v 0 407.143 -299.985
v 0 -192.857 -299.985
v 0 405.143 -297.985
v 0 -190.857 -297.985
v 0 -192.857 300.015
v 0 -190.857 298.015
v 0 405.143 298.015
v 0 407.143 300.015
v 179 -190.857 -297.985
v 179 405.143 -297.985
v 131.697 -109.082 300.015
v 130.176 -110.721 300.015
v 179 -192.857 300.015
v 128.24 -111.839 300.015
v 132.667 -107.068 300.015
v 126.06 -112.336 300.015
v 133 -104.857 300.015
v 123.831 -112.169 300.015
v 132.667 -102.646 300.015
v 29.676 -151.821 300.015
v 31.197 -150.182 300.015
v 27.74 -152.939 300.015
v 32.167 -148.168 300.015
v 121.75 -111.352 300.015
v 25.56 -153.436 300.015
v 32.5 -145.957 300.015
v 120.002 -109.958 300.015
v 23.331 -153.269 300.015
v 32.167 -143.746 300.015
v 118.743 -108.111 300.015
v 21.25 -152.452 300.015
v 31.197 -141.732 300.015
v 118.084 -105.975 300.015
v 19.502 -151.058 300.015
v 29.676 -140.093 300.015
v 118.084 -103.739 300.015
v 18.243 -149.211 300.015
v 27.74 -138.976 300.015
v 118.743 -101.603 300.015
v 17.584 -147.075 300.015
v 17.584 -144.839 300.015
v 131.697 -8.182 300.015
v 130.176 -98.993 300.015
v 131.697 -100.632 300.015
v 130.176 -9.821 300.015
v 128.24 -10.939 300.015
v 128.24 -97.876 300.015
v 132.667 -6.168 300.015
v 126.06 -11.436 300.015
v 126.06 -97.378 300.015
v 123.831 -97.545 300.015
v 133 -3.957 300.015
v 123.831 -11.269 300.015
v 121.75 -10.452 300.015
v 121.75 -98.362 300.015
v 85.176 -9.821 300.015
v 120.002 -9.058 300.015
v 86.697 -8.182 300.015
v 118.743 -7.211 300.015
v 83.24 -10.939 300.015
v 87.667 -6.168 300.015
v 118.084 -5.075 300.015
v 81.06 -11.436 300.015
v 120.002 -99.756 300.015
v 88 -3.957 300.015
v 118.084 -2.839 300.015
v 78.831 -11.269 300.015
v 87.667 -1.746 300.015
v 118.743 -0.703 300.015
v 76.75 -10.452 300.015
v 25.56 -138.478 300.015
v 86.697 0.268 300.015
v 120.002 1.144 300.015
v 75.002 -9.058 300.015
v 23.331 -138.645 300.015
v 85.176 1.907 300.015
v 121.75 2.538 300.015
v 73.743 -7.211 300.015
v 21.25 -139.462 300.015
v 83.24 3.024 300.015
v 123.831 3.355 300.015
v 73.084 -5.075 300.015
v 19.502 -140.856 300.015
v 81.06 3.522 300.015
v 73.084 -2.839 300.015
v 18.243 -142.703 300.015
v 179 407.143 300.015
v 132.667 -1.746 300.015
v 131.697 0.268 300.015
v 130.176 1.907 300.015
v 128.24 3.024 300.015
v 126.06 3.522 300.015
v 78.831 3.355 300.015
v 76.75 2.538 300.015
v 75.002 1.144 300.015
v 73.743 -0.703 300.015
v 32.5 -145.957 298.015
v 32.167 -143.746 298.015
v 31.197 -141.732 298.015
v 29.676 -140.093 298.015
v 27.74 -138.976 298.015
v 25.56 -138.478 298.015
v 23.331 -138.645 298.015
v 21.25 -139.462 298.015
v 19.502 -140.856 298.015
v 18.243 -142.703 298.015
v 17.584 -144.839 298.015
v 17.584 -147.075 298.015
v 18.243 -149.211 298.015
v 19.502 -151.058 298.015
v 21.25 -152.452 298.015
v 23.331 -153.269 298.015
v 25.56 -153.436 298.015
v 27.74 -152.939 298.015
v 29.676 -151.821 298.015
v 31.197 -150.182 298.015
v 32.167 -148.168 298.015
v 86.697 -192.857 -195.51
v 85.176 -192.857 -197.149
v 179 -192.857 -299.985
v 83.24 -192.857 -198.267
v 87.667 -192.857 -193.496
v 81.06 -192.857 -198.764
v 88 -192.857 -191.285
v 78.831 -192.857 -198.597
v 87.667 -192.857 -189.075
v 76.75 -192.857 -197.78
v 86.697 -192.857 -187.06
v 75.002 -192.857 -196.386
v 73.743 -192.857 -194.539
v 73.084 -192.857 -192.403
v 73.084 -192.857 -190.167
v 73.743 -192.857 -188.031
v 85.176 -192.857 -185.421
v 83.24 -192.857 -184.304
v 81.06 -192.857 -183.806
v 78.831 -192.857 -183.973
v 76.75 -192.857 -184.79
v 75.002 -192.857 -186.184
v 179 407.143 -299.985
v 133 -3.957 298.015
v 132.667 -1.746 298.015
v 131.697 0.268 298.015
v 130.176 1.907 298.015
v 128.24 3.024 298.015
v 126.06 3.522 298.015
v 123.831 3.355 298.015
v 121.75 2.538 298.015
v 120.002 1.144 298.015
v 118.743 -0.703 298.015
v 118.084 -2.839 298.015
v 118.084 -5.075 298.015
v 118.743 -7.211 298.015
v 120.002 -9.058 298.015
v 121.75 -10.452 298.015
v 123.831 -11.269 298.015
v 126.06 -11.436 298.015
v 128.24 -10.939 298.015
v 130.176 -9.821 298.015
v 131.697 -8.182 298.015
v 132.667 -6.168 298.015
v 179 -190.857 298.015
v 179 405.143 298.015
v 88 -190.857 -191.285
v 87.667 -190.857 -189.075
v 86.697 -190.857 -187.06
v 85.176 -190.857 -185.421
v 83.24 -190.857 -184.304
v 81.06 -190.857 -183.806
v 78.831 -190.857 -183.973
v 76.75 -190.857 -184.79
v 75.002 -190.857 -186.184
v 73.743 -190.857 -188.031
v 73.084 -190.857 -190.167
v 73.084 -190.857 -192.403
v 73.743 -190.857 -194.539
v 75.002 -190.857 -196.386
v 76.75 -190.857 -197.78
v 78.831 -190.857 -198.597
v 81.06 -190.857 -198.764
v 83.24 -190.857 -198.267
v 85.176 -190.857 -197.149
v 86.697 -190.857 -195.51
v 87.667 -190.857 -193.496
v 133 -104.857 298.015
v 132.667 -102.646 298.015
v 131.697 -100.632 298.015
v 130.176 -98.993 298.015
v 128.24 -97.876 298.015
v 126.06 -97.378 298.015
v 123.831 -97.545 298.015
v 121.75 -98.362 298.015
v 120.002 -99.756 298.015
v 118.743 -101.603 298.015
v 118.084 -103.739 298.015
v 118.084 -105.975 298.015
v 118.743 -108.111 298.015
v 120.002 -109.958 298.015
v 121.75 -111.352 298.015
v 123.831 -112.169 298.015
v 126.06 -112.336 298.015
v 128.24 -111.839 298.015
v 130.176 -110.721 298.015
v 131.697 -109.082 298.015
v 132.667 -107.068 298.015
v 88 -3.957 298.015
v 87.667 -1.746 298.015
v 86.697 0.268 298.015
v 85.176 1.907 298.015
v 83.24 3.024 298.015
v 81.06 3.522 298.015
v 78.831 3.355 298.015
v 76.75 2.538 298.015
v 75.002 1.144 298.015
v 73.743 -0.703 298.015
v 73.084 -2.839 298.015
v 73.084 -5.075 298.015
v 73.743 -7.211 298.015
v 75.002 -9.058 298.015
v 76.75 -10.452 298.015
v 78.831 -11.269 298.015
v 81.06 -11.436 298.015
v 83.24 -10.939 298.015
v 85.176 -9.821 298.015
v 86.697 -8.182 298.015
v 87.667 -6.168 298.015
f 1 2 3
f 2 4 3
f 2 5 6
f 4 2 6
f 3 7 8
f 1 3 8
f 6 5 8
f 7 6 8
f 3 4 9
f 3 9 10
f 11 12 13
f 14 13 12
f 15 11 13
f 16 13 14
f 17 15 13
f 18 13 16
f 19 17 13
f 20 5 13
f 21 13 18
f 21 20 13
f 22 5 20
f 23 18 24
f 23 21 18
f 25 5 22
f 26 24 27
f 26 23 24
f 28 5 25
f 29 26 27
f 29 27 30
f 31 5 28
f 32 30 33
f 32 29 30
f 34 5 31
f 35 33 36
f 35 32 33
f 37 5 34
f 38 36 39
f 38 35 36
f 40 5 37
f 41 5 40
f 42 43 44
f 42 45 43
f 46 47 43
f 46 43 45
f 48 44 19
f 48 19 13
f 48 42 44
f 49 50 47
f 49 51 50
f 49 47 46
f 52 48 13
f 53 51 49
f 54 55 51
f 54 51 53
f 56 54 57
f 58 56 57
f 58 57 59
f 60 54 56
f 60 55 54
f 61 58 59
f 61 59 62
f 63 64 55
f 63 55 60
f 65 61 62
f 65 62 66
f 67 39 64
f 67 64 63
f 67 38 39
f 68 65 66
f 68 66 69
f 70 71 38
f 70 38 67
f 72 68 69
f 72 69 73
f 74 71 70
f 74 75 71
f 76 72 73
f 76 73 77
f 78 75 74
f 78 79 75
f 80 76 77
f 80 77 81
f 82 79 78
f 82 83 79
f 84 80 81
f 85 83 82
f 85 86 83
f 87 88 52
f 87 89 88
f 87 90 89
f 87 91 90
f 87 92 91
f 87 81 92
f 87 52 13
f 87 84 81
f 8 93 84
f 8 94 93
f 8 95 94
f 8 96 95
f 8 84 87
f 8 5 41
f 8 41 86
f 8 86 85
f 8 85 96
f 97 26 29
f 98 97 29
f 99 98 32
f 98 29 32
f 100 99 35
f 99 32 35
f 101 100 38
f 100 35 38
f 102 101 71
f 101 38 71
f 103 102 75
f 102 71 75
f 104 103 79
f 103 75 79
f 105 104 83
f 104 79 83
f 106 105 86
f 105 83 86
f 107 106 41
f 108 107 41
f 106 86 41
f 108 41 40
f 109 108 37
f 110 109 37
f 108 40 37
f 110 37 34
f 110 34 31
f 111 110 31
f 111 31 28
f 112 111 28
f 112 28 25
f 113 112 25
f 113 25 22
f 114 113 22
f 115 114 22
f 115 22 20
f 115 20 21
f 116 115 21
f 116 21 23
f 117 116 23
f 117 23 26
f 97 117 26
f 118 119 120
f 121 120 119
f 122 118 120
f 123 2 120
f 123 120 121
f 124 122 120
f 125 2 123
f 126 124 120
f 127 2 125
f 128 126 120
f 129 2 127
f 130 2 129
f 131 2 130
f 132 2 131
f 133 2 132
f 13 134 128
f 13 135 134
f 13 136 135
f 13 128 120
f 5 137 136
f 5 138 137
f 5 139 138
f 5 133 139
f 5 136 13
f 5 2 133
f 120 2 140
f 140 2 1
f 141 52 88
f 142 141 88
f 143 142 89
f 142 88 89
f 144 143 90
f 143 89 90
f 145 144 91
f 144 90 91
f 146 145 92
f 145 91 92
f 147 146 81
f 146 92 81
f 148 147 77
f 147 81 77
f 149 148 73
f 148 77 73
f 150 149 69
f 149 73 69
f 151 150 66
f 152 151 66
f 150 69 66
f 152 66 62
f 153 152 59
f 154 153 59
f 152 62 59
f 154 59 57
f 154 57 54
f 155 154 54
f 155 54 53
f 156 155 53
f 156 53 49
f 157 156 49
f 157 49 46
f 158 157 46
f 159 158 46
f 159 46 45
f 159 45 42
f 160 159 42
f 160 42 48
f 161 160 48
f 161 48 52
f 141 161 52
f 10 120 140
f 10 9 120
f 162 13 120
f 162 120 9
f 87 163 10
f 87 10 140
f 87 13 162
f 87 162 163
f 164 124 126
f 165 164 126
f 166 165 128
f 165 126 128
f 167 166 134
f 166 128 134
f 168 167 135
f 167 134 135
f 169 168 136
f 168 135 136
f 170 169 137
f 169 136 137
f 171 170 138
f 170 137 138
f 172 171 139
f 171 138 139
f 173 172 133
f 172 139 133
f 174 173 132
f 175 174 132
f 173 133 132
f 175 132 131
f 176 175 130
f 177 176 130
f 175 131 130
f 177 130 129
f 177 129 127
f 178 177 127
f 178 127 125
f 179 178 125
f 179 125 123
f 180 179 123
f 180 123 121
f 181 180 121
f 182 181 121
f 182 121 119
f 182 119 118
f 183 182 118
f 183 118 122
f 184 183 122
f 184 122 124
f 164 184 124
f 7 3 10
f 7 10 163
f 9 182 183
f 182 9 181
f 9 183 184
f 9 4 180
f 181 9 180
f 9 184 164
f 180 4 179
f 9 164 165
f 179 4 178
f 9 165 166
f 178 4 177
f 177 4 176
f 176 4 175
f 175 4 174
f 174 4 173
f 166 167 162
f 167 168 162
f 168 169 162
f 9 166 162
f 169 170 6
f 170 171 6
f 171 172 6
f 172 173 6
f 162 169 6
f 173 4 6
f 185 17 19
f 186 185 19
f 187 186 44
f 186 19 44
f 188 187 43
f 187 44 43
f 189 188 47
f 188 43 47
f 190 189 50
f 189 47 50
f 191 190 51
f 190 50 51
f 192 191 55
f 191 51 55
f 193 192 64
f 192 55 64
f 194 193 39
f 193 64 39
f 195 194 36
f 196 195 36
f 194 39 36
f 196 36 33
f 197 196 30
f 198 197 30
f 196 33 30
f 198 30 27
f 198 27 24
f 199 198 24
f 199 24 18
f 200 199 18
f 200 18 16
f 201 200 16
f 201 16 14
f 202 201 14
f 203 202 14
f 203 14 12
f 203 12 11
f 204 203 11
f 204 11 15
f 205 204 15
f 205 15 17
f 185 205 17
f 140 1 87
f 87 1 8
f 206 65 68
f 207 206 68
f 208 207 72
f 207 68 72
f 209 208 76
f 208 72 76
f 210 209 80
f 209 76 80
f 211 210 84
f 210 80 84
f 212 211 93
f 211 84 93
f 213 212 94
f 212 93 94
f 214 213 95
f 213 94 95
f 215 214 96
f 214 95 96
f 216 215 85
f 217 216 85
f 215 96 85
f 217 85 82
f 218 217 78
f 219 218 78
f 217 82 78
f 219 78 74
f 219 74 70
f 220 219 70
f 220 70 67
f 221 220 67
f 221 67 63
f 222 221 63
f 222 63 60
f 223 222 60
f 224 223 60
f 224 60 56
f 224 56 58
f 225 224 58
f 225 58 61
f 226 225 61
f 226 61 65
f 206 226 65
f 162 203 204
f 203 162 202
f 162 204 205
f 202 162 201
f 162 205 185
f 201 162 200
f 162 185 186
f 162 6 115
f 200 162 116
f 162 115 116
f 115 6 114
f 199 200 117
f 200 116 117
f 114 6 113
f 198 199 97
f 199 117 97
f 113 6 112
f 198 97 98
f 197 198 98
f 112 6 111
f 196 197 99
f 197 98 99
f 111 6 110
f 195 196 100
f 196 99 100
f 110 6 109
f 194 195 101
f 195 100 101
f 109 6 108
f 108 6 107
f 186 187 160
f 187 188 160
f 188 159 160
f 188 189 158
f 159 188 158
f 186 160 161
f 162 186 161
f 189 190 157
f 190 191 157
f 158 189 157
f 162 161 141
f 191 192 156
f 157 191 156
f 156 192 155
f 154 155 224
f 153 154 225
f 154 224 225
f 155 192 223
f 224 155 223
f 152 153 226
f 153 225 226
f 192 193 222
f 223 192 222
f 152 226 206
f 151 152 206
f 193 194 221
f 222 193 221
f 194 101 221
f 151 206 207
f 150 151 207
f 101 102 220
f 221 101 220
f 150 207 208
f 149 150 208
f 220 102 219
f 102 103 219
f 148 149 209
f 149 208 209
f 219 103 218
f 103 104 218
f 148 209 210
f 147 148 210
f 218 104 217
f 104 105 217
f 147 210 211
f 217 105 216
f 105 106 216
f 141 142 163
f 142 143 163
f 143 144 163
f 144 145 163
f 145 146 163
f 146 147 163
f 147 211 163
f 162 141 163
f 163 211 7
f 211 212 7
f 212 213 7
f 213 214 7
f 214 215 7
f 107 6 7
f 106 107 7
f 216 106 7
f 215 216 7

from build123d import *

# Parameters (mm, degrees)
F0_W     = 600
F0_H     = 600
F0_W_2   = 596
F0_H_2   = 596
F1_DEPTH = 179
F2_R     = 7.5
F3_DEPTH = 25
F4_R     = 7.5
F5_DEPTH = 25


with BuildPart() as f1:
    # F0 (on Right) → F1 (new body)
    with BuildSketch(Plane.YZ):
        with Locations((107.142857, 0.014796)):
            Rectangle(F0_W, F0_H)
        with Locations((107.142857, 0.014796)):
            Rectangle(F0_W_2, F0_H_2, mode=Mode.SUBTRACT)
    extrude(amount=F1_DEPTH)

    # F2 (on face) → F3 (cut)
    with BuildSketch(Plane.XY.offset(300.014796)):
        with Locations((25, -145.957143)):
            Circle(F2_R)
        with Locations((80.5, -3.957143)):
            Circle(F2_R)
        with Locations((125.5, -3.957143)):
            Circle(F2_R)
        with Locations((125.5, -104.857143)):
            Circle(F2_R)
    extrude(amount=-F3_DEPTH, mode=Mode.SUBTRACT)

    # F4 (on face) → F5 (cut)
    with BuildSketch(Plane.XZ.offset(192.857143)):
        with Locations((80.5, -191.285204)):
            Circle(F4_R)
    extrude(amount=-F5_DEPTH, mode=Mode.SUBTRACT)


solid = f1.part
